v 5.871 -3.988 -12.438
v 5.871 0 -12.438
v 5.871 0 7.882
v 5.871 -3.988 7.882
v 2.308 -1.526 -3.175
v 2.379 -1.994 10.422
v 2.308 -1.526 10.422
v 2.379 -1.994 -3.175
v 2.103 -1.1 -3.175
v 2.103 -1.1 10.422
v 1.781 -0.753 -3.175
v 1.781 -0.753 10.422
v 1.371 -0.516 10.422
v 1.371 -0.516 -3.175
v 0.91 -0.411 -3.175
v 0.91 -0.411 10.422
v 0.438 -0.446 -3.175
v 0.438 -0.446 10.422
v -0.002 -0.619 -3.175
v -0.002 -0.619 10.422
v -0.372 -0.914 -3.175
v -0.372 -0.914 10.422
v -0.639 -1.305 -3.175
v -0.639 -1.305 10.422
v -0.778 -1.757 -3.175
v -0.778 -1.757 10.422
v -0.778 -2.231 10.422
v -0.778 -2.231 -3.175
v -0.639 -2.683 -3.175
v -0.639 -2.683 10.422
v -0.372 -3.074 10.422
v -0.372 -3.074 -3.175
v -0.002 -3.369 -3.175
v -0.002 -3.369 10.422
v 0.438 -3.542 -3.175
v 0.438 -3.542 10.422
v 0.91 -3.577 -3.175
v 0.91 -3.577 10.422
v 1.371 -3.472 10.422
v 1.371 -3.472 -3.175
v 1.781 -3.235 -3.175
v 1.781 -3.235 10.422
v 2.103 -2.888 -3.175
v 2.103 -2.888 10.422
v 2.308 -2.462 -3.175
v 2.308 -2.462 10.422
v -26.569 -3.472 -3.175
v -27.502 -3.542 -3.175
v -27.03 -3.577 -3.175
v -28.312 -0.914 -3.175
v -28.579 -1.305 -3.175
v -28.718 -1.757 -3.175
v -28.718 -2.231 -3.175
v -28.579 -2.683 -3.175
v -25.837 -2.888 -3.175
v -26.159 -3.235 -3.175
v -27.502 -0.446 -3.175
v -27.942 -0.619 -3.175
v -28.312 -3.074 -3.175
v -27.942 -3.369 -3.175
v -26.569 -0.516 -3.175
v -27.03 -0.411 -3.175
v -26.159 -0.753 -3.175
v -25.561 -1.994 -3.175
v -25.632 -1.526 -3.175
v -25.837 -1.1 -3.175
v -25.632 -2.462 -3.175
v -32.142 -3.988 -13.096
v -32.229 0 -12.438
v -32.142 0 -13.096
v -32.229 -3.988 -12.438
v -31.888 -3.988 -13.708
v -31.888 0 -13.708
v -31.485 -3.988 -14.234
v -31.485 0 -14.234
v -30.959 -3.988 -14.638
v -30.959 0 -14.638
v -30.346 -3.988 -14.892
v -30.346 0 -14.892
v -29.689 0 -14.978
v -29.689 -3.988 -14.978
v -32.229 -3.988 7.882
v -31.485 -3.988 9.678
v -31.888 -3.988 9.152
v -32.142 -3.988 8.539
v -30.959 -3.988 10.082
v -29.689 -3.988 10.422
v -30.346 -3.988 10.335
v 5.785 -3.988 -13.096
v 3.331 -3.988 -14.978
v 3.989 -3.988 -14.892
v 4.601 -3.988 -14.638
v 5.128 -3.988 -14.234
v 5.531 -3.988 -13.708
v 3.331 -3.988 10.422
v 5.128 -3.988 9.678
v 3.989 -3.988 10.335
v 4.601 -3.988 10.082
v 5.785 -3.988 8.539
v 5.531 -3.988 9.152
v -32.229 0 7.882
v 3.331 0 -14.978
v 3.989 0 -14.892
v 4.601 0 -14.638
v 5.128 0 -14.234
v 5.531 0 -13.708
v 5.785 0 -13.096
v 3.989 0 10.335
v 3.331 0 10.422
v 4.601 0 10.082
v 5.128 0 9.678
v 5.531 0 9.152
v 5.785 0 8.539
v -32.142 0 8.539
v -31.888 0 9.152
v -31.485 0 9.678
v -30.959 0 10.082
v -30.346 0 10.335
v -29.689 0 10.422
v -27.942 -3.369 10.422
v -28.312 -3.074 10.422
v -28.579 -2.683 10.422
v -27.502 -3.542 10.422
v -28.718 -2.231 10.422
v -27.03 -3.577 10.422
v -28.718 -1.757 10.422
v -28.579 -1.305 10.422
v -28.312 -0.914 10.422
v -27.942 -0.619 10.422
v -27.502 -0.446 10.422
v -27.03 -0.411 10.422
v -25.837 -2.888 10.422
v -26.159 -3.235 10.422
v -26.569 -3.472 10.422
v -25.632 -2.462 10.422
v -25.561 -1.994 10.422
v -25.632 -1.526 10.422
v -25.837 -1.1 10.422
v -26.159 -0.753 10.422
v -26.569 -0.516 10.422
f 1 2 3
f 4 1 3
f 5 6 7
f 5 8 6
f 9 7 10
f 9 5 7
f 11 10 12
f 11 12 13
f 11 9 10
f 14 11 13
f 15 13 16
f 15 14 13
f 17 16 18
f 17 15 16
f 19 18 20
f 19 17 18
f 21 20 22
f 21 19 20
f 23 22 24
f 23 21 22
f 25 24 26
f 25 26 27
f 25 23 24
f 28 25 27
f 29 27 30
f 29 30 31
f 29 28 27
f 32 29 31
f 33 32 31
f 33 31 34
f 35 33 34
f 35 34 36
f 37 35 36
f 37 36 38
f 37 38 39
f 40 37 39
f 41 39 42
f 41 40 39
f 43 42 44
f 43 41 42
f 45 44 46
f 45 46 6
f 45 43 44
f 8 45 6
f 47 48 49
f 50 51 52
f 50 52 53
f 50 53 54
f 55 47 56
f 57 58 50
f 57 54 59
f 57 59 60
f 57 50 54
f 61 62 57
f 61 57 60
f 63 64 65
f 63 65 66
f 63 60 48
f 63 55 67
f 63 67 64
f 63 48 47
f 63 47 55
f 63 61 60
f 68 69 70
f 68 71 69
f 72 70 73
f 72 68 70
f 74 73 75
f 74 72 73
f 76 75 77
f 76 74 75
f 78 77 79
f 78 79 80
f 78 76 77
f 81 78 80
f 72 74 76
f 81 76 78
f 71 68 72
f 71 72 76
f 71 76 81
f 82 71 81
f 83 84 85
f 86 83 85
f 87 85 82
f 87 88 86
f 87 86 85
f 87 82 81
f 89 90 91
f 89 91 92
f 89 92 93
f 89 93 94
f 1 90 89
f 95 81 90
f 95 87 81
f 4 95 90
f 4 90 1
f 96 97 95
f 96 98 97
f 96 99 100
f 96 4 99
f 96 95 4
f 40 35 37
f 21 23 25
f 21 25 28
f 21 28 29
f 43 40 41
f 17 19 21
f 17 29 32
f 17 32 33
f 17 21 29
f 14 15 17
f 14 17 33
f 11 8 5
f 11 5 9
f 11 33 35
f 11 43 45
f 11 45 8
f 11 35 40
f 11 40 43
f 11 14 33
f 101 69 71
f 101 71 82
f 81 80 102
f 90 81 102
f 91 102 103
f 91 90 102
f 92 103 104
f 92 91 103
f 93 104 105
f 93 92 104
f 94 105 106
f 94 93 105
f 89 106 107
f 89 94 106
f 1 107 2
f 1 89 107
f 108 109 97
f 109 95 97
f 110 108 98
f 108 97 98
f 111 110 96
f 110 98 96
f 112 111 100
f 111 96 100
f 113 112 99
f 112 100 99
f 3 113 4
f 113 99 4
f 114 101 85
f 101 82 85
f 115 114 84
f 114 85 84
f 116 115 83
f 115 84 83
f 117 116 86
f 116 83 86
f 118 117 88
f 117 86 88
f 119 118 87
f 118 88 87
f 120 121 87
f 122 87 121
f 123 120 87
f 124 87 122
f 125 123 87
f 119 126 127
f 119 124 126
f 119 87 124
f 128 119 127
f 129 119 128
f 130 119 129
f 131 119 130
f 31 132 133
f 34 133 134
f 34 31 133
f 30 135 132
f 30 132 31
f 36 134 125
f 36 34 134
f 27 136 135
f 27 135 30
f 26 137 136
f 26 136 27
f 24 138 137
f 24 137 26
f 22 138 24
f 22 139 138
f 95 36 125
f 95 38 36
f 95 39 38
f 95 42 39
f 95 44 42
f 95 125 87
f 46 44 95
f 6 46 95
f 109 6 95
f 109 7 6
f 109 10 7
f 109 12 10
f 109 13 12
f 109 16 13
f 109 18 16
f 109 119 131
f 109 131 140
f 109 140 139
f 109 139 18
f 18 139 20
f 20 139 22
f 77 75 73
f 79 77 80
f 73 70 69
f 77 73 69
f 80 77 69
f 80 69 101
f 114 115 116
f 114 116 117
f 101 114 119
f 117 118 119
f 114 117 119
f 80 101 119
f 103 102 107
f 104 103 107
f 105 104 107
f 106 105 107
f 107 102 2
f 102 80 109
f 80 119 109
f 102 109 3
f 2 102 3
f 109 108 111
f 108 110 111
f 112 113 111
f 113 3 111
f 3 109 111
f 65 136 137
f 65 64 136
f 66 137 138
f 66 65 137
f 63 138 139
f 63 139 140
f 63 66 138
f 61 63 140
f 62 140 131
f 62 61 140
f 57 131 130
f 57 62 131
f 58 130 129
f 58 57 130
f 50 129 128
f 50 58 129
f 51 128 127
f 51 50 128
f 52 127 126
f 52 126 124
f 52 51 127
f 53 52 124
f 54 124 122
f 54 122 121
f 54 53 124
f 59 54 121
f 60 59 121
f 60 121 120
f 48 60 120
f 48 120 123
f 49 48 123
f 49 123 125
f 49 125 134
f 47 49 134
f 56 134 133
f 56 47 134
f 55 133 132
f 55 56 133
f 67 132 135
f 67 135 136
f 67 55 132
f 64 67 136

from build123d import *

# Parameters (mm, degrees)
F0_W          = 38.1
F0_H          = 25.4
F1_DEPTH      = 3.9878
F2_R          = 2.54
F3_R          = 2.54
F4_R          = 2.54
F5_R          = 2.54
F6_R          = 1.5875
F7_DEPTH      = 10.421824
F7_DEPTH_BACK = 3.175


with BuildPart() as f1:
    # F0 (on Front) → F1 (new body)
    with BuildSketch(Plane.XZ):
        with Locations((-13.178508, -2.278176)):
            Rectangle(F0_W, F0_H)
    extrude(amount=F1_DEPTH)

    # F2
    f2_edges = [f1.edges().sort_by_distance(p)[0] for p in [
        (-32.228508, -1.9939, -14.978176),
    ]]
    fillet(f2_edges, radius=F2_R)

    # F3
    f3_edges = [f1.edges().sort_by_distance(p)[0] for p in [
        (5.871492, -1.9939, -14.978176),
    ]]
    fillet(f3_edges, radius=F3_R)

    # F4
    f4_edges = [f1.edges().sort_by_distance(p)[0] for p in [
        (-32.228508, -1.9939, 10.421824),
    ]]
    fillet(f4_edges, radius=F4_R)

    # F5
    f5_edges = [f1.edges().sort_by_distance(p)[0] for p in [
        (5.871492, -1.9939, 10.421824),
    ]]
    fillet(f5_edges, radius=F5_R)

    # F6 (on Top) → F7 (cut, two sides)
    with BuildSketch(Plane.XY) as f7_sk:
        with Locations((-27.148508, -1.9939)):
            Circle(F6_R)
        with Locations((0.791492, -1.9939)):
            Circle(F6_R)
    extrude(amount=F7_DEPTH, mode=Mode.SUBTRACT)
    extrude(f7_sk.sketch, amount=-F7_DEPTH_BACK, mode=Mode.SUBTRACT)


solid = f1.part
